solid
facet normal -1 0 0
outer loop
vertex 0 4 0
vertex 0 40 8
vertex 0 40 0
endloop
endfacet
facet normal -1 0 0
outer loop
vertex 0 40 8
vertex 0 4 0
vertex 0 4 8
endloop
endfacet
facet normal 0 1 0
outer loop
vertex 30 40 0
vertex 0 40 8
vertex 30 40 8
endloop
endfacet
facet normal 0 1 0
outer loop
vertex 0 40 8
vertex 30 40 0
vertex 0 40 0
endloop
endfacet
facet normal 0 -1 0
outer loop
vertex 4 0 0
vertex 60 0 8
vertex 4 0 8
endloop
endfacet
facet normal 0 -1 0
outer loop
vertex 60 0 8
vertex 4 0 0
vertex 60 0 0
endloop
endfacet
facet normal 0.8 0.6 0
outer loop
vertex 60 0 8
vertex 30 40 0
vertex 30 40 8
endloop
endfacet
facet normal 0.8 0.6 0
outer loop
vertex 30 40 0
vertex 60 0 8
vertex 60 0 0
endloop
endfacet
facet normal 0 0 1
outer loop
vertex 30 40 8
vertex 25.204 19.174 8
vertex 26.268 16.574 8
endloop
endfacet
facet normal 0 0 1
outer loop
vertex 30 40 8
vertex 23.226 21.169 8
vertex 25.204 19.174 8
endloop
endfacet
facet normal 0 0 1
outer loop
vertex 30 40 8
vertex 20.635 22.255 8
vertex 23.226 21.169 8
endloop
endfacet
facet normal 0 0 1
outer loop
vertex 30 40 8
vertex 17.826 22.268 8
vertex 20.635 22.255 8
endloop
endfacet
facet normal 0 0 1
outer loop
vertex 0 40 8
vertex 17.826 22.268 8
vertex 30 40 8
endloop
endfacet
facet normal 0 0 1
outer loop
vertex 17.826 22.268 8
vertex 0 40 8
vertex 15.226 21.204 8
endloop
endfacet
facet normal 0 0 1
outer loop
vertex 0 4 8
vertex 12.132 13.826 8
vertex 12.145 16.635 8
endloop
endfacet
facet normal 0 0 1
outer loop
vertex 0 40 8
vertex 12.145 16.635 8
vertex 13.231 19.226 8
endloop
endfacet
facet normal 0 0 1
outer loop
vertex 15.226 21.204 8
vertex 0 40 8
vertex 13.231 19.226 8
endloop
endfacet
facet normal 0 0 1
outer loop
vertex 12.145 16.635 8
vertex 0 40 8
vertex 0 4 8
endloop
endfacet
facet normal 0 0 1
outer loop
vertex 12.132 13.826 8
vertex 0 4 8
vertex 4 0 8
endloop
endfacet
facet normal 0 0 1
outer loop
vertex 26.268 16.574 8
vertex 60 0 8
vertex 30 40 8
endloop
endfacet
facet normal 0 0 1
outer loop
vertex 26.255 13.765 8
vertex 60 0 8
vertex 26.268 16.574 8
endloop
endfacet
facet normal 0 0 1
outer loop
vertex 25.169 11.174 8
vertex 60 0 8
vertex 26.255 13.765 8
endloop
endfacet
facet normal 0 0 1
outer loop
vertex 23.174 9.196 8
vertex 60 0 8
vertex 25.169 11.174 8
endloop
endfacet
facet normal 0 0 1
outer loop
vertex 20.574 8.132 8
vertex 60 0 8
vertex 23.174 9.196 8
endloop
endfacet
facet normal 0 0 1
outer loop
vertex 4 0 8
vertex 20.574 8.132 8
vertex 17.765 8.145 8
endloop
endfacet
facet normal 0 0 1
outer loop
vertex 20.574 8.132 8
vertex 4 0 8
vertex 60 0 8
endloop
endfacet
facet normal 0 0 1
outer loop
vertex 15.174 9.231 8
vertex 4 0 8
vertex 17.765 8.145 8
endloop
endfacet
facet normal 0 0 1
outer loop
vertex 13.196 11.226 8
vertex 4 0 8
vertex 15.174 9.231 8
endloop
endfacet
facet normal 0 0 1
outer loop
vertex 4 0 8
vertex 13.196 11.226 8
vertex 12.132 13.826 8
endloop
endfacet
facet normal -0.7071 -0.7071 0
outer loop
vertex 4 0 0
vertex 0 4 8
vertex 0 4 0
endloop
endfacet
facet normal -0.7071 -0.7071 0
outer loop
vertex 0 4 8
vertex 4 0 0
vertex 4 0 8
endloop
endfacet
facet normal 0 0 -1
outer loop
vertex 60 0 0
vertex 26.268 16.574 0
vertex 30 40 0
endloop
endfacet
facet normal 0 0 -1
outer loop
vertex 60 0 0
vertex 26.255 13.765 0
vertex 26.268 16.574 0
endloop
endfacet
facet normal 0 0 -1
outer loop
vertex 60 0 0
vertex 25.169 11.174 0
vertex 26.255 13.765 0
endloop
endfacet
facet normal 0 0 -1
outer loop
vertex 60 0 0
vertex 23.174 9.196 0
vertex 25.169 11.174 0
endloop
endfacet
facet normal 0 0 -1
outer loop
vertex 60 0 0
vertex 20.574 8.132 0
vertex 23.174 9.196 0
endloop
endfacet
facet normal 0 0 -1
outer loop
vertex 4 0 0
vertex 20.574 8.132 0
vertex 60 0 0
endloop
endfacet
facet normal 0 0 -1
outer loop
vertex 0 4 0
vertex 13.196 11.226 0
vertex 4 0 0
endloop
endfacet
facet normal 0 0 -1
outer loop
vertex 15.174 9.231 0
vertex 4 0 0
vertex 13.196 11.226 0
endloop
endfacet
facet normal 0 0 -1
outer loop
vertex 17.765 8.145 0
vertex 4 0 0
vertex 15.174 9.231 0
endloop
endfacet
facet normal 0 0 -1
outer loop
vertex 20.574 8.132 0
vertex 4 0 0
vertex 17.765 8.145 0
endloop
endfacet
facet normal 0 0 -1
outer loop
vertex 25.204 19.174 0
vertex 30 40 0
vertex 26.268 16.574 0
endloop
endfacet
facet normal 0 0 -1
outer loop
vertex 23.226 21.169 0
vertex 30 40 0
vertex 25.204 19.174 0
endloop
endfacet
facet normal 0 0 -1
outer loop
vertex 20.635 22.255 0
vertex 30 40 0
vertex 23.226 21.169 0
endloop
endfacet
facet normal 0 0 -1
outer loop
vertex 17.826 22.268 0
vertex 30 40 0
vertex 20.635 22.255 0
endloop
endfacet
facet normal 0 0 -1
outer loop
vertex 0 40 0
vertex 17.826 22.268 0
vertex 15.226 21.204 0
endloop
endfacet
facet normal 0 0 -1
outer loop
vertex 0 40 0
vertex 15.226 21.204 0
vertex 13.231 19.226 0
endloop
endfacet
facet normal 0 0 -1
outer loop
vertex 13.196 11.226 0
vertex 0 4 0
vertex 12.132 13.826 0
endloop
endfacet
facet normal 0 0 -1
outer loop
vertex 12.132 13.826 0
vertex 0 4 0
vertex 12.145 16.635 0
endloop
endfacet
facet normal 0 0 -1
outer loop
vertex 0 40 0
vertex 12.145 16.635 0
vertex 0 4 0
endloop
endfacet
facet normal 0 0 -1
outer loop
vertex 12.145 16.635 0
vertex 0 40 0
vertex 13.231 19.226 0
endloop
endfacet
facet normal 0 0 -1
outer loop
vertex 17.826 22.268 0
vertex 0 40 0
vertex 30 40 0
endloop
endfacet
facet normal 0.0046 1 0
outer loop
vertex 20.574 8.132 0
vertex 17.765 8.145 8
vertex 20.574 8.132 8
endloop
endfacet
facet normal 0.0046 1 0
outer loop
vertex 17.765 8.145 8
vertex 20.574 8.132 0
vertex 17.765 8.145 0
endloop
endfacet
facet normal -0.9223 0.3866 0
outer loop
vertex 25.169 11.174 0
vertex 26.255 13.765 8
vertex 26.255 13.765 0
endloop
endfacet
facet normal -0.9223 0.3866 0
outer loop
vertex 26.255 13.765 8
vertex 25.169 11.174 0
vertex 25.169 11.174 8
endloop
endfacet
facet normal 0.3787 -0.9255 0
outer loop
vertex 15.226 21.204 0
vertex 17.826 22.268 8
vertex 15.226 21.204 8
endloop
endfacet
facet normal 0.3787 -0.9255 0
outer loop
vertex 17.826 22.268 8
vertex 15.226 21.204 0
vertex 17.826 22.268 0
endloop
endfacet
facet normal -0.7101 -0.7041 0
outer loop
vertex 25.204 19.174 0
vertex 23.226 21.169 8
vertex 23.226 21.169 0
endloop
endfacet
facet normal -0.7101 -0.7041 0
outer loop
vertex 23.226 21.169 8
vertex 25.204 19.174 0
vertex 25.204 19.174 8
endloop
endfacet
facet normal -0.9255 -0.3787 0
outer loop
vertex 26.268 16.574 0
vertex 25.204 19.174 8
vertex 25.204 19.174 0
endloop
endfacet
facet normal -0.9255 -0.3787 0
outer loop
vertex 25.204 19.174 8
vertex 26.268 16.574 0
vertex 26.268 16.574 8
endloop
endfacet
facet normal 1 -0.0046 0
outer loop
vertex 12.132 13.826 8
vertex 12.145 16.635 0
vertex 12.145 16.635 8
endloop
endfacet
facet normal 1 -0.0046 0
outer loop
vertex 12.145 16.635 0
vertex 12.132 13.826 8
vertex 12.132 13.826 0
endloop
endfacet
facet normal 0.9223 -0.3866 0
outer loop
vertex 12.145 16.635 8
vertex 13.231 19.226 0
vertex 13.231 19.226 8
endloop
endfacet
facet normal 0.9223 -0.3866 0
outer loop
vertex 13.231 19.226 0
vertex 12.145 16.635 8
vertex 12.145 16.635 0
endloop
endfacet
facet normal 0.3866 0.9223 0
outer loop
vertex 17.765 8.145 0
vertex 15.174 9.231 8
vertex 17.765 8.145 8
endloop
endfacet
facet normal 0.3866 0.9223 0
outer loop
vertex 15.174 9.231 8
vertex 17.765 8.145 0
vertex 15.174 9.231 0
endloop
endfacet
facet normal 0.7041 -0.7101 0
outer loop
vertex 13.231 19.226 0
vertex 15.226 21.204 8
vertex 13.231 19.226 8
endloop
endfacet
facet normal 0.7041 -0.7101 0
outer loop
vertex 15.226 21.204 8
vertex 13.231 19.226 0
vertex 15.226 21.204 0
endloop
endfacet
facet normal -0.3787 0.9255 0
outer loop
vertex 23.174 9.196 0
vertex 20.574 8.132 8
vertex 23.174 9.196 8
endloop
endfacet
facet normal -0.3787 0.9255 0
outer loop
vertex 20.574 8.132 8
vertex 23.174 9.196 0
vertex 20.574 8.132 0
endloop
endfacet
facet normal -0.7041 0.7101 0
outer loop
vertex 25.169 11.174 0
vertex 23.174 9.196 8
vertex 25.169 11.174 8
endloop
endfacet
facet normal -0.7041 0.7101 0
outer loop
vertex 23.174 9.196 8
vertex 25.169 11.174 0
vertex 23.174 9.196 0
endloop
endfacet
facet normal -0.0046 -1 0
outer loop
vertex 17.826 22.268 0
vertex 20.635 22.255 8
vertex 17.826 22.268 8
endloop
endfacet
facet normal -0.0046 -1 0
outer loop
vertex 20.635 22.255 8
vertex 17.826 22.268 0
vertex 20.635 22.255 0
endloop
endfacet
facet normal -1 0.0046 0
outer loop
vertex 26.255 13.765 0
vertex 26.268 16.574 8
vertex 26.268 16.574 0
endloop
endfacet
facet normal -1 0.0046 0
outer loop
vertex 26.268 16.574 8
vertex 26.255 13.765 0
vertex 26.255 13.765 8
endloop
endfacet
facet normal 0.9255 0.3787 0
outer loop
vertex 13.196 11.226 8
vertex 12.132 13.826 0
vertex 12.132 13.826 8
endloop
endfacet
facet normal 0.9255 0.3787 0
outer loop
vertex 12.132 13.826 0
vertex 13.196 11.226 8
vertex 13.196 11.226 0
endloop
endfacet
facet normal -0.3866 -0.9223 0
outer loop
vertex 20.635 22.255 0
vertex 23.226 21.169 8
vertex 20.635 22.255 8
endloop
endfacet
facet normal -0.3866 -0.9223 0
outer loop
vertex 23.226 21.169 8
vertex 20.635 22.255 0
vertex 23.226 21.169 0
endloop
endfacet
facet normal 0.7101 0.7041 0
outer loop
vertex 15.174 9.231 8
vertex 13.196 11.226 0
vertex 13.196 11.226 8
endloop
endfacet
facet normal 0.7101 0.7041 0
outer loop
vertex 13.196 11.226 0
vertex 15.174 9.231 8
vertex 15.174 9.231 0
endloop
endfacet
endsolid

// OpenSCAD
$fn = 32;

// ----------------------------------------------------------------------
// Bracket plate: gusset 60 x 40
// ----------------------------------------------------------------------

// --- parameters (mm) ---
hole_r = 3;               // bolt hole radius
plate_t = 8;              // plate thickness, Z (extrusion height)
gus_a = 60;               // base length
gus_b = 40;               // height
top_x = 30;               // top edge X of the angled cut
light_r = 7.2;            // lightening hole radius
fit_tol = 0.02;           // declared fit tolerance (prompt contract)
free_tol = 0.2;           // declared free tolerance (prompt contract)

light_d = 2 * light_r;

profile = [[4, 0], [30, 0], [60, 0], [30, 40], [0, 40], [0, 4]];  // primary outline, 6 points, counter clockwise
void_1 = [[26.268, 16.574], [25.204, 19.174], [23.226, 21.169], [20.635, 22.255], [17.826, 22.268], [15.226, 21.204], [13.231, 19.226], [12.145, 16.635], [12.132, 13.826], [13.196, 11.226], [15.174, 9.231], [17.765, 8.145], [20.574, 8.132], [23.174, 9.196], [25.169, 11.174], [26.255, 13.765]];  // lightening hole, 16 points

// --- the one profile operation ---
difference() {
  linear_extrude(height = plate_t) polygon(points = profile);
  translate([0, 0, -1])
    linear_extrude(height = plate_t + 2) polygon(points = void_1);
}
